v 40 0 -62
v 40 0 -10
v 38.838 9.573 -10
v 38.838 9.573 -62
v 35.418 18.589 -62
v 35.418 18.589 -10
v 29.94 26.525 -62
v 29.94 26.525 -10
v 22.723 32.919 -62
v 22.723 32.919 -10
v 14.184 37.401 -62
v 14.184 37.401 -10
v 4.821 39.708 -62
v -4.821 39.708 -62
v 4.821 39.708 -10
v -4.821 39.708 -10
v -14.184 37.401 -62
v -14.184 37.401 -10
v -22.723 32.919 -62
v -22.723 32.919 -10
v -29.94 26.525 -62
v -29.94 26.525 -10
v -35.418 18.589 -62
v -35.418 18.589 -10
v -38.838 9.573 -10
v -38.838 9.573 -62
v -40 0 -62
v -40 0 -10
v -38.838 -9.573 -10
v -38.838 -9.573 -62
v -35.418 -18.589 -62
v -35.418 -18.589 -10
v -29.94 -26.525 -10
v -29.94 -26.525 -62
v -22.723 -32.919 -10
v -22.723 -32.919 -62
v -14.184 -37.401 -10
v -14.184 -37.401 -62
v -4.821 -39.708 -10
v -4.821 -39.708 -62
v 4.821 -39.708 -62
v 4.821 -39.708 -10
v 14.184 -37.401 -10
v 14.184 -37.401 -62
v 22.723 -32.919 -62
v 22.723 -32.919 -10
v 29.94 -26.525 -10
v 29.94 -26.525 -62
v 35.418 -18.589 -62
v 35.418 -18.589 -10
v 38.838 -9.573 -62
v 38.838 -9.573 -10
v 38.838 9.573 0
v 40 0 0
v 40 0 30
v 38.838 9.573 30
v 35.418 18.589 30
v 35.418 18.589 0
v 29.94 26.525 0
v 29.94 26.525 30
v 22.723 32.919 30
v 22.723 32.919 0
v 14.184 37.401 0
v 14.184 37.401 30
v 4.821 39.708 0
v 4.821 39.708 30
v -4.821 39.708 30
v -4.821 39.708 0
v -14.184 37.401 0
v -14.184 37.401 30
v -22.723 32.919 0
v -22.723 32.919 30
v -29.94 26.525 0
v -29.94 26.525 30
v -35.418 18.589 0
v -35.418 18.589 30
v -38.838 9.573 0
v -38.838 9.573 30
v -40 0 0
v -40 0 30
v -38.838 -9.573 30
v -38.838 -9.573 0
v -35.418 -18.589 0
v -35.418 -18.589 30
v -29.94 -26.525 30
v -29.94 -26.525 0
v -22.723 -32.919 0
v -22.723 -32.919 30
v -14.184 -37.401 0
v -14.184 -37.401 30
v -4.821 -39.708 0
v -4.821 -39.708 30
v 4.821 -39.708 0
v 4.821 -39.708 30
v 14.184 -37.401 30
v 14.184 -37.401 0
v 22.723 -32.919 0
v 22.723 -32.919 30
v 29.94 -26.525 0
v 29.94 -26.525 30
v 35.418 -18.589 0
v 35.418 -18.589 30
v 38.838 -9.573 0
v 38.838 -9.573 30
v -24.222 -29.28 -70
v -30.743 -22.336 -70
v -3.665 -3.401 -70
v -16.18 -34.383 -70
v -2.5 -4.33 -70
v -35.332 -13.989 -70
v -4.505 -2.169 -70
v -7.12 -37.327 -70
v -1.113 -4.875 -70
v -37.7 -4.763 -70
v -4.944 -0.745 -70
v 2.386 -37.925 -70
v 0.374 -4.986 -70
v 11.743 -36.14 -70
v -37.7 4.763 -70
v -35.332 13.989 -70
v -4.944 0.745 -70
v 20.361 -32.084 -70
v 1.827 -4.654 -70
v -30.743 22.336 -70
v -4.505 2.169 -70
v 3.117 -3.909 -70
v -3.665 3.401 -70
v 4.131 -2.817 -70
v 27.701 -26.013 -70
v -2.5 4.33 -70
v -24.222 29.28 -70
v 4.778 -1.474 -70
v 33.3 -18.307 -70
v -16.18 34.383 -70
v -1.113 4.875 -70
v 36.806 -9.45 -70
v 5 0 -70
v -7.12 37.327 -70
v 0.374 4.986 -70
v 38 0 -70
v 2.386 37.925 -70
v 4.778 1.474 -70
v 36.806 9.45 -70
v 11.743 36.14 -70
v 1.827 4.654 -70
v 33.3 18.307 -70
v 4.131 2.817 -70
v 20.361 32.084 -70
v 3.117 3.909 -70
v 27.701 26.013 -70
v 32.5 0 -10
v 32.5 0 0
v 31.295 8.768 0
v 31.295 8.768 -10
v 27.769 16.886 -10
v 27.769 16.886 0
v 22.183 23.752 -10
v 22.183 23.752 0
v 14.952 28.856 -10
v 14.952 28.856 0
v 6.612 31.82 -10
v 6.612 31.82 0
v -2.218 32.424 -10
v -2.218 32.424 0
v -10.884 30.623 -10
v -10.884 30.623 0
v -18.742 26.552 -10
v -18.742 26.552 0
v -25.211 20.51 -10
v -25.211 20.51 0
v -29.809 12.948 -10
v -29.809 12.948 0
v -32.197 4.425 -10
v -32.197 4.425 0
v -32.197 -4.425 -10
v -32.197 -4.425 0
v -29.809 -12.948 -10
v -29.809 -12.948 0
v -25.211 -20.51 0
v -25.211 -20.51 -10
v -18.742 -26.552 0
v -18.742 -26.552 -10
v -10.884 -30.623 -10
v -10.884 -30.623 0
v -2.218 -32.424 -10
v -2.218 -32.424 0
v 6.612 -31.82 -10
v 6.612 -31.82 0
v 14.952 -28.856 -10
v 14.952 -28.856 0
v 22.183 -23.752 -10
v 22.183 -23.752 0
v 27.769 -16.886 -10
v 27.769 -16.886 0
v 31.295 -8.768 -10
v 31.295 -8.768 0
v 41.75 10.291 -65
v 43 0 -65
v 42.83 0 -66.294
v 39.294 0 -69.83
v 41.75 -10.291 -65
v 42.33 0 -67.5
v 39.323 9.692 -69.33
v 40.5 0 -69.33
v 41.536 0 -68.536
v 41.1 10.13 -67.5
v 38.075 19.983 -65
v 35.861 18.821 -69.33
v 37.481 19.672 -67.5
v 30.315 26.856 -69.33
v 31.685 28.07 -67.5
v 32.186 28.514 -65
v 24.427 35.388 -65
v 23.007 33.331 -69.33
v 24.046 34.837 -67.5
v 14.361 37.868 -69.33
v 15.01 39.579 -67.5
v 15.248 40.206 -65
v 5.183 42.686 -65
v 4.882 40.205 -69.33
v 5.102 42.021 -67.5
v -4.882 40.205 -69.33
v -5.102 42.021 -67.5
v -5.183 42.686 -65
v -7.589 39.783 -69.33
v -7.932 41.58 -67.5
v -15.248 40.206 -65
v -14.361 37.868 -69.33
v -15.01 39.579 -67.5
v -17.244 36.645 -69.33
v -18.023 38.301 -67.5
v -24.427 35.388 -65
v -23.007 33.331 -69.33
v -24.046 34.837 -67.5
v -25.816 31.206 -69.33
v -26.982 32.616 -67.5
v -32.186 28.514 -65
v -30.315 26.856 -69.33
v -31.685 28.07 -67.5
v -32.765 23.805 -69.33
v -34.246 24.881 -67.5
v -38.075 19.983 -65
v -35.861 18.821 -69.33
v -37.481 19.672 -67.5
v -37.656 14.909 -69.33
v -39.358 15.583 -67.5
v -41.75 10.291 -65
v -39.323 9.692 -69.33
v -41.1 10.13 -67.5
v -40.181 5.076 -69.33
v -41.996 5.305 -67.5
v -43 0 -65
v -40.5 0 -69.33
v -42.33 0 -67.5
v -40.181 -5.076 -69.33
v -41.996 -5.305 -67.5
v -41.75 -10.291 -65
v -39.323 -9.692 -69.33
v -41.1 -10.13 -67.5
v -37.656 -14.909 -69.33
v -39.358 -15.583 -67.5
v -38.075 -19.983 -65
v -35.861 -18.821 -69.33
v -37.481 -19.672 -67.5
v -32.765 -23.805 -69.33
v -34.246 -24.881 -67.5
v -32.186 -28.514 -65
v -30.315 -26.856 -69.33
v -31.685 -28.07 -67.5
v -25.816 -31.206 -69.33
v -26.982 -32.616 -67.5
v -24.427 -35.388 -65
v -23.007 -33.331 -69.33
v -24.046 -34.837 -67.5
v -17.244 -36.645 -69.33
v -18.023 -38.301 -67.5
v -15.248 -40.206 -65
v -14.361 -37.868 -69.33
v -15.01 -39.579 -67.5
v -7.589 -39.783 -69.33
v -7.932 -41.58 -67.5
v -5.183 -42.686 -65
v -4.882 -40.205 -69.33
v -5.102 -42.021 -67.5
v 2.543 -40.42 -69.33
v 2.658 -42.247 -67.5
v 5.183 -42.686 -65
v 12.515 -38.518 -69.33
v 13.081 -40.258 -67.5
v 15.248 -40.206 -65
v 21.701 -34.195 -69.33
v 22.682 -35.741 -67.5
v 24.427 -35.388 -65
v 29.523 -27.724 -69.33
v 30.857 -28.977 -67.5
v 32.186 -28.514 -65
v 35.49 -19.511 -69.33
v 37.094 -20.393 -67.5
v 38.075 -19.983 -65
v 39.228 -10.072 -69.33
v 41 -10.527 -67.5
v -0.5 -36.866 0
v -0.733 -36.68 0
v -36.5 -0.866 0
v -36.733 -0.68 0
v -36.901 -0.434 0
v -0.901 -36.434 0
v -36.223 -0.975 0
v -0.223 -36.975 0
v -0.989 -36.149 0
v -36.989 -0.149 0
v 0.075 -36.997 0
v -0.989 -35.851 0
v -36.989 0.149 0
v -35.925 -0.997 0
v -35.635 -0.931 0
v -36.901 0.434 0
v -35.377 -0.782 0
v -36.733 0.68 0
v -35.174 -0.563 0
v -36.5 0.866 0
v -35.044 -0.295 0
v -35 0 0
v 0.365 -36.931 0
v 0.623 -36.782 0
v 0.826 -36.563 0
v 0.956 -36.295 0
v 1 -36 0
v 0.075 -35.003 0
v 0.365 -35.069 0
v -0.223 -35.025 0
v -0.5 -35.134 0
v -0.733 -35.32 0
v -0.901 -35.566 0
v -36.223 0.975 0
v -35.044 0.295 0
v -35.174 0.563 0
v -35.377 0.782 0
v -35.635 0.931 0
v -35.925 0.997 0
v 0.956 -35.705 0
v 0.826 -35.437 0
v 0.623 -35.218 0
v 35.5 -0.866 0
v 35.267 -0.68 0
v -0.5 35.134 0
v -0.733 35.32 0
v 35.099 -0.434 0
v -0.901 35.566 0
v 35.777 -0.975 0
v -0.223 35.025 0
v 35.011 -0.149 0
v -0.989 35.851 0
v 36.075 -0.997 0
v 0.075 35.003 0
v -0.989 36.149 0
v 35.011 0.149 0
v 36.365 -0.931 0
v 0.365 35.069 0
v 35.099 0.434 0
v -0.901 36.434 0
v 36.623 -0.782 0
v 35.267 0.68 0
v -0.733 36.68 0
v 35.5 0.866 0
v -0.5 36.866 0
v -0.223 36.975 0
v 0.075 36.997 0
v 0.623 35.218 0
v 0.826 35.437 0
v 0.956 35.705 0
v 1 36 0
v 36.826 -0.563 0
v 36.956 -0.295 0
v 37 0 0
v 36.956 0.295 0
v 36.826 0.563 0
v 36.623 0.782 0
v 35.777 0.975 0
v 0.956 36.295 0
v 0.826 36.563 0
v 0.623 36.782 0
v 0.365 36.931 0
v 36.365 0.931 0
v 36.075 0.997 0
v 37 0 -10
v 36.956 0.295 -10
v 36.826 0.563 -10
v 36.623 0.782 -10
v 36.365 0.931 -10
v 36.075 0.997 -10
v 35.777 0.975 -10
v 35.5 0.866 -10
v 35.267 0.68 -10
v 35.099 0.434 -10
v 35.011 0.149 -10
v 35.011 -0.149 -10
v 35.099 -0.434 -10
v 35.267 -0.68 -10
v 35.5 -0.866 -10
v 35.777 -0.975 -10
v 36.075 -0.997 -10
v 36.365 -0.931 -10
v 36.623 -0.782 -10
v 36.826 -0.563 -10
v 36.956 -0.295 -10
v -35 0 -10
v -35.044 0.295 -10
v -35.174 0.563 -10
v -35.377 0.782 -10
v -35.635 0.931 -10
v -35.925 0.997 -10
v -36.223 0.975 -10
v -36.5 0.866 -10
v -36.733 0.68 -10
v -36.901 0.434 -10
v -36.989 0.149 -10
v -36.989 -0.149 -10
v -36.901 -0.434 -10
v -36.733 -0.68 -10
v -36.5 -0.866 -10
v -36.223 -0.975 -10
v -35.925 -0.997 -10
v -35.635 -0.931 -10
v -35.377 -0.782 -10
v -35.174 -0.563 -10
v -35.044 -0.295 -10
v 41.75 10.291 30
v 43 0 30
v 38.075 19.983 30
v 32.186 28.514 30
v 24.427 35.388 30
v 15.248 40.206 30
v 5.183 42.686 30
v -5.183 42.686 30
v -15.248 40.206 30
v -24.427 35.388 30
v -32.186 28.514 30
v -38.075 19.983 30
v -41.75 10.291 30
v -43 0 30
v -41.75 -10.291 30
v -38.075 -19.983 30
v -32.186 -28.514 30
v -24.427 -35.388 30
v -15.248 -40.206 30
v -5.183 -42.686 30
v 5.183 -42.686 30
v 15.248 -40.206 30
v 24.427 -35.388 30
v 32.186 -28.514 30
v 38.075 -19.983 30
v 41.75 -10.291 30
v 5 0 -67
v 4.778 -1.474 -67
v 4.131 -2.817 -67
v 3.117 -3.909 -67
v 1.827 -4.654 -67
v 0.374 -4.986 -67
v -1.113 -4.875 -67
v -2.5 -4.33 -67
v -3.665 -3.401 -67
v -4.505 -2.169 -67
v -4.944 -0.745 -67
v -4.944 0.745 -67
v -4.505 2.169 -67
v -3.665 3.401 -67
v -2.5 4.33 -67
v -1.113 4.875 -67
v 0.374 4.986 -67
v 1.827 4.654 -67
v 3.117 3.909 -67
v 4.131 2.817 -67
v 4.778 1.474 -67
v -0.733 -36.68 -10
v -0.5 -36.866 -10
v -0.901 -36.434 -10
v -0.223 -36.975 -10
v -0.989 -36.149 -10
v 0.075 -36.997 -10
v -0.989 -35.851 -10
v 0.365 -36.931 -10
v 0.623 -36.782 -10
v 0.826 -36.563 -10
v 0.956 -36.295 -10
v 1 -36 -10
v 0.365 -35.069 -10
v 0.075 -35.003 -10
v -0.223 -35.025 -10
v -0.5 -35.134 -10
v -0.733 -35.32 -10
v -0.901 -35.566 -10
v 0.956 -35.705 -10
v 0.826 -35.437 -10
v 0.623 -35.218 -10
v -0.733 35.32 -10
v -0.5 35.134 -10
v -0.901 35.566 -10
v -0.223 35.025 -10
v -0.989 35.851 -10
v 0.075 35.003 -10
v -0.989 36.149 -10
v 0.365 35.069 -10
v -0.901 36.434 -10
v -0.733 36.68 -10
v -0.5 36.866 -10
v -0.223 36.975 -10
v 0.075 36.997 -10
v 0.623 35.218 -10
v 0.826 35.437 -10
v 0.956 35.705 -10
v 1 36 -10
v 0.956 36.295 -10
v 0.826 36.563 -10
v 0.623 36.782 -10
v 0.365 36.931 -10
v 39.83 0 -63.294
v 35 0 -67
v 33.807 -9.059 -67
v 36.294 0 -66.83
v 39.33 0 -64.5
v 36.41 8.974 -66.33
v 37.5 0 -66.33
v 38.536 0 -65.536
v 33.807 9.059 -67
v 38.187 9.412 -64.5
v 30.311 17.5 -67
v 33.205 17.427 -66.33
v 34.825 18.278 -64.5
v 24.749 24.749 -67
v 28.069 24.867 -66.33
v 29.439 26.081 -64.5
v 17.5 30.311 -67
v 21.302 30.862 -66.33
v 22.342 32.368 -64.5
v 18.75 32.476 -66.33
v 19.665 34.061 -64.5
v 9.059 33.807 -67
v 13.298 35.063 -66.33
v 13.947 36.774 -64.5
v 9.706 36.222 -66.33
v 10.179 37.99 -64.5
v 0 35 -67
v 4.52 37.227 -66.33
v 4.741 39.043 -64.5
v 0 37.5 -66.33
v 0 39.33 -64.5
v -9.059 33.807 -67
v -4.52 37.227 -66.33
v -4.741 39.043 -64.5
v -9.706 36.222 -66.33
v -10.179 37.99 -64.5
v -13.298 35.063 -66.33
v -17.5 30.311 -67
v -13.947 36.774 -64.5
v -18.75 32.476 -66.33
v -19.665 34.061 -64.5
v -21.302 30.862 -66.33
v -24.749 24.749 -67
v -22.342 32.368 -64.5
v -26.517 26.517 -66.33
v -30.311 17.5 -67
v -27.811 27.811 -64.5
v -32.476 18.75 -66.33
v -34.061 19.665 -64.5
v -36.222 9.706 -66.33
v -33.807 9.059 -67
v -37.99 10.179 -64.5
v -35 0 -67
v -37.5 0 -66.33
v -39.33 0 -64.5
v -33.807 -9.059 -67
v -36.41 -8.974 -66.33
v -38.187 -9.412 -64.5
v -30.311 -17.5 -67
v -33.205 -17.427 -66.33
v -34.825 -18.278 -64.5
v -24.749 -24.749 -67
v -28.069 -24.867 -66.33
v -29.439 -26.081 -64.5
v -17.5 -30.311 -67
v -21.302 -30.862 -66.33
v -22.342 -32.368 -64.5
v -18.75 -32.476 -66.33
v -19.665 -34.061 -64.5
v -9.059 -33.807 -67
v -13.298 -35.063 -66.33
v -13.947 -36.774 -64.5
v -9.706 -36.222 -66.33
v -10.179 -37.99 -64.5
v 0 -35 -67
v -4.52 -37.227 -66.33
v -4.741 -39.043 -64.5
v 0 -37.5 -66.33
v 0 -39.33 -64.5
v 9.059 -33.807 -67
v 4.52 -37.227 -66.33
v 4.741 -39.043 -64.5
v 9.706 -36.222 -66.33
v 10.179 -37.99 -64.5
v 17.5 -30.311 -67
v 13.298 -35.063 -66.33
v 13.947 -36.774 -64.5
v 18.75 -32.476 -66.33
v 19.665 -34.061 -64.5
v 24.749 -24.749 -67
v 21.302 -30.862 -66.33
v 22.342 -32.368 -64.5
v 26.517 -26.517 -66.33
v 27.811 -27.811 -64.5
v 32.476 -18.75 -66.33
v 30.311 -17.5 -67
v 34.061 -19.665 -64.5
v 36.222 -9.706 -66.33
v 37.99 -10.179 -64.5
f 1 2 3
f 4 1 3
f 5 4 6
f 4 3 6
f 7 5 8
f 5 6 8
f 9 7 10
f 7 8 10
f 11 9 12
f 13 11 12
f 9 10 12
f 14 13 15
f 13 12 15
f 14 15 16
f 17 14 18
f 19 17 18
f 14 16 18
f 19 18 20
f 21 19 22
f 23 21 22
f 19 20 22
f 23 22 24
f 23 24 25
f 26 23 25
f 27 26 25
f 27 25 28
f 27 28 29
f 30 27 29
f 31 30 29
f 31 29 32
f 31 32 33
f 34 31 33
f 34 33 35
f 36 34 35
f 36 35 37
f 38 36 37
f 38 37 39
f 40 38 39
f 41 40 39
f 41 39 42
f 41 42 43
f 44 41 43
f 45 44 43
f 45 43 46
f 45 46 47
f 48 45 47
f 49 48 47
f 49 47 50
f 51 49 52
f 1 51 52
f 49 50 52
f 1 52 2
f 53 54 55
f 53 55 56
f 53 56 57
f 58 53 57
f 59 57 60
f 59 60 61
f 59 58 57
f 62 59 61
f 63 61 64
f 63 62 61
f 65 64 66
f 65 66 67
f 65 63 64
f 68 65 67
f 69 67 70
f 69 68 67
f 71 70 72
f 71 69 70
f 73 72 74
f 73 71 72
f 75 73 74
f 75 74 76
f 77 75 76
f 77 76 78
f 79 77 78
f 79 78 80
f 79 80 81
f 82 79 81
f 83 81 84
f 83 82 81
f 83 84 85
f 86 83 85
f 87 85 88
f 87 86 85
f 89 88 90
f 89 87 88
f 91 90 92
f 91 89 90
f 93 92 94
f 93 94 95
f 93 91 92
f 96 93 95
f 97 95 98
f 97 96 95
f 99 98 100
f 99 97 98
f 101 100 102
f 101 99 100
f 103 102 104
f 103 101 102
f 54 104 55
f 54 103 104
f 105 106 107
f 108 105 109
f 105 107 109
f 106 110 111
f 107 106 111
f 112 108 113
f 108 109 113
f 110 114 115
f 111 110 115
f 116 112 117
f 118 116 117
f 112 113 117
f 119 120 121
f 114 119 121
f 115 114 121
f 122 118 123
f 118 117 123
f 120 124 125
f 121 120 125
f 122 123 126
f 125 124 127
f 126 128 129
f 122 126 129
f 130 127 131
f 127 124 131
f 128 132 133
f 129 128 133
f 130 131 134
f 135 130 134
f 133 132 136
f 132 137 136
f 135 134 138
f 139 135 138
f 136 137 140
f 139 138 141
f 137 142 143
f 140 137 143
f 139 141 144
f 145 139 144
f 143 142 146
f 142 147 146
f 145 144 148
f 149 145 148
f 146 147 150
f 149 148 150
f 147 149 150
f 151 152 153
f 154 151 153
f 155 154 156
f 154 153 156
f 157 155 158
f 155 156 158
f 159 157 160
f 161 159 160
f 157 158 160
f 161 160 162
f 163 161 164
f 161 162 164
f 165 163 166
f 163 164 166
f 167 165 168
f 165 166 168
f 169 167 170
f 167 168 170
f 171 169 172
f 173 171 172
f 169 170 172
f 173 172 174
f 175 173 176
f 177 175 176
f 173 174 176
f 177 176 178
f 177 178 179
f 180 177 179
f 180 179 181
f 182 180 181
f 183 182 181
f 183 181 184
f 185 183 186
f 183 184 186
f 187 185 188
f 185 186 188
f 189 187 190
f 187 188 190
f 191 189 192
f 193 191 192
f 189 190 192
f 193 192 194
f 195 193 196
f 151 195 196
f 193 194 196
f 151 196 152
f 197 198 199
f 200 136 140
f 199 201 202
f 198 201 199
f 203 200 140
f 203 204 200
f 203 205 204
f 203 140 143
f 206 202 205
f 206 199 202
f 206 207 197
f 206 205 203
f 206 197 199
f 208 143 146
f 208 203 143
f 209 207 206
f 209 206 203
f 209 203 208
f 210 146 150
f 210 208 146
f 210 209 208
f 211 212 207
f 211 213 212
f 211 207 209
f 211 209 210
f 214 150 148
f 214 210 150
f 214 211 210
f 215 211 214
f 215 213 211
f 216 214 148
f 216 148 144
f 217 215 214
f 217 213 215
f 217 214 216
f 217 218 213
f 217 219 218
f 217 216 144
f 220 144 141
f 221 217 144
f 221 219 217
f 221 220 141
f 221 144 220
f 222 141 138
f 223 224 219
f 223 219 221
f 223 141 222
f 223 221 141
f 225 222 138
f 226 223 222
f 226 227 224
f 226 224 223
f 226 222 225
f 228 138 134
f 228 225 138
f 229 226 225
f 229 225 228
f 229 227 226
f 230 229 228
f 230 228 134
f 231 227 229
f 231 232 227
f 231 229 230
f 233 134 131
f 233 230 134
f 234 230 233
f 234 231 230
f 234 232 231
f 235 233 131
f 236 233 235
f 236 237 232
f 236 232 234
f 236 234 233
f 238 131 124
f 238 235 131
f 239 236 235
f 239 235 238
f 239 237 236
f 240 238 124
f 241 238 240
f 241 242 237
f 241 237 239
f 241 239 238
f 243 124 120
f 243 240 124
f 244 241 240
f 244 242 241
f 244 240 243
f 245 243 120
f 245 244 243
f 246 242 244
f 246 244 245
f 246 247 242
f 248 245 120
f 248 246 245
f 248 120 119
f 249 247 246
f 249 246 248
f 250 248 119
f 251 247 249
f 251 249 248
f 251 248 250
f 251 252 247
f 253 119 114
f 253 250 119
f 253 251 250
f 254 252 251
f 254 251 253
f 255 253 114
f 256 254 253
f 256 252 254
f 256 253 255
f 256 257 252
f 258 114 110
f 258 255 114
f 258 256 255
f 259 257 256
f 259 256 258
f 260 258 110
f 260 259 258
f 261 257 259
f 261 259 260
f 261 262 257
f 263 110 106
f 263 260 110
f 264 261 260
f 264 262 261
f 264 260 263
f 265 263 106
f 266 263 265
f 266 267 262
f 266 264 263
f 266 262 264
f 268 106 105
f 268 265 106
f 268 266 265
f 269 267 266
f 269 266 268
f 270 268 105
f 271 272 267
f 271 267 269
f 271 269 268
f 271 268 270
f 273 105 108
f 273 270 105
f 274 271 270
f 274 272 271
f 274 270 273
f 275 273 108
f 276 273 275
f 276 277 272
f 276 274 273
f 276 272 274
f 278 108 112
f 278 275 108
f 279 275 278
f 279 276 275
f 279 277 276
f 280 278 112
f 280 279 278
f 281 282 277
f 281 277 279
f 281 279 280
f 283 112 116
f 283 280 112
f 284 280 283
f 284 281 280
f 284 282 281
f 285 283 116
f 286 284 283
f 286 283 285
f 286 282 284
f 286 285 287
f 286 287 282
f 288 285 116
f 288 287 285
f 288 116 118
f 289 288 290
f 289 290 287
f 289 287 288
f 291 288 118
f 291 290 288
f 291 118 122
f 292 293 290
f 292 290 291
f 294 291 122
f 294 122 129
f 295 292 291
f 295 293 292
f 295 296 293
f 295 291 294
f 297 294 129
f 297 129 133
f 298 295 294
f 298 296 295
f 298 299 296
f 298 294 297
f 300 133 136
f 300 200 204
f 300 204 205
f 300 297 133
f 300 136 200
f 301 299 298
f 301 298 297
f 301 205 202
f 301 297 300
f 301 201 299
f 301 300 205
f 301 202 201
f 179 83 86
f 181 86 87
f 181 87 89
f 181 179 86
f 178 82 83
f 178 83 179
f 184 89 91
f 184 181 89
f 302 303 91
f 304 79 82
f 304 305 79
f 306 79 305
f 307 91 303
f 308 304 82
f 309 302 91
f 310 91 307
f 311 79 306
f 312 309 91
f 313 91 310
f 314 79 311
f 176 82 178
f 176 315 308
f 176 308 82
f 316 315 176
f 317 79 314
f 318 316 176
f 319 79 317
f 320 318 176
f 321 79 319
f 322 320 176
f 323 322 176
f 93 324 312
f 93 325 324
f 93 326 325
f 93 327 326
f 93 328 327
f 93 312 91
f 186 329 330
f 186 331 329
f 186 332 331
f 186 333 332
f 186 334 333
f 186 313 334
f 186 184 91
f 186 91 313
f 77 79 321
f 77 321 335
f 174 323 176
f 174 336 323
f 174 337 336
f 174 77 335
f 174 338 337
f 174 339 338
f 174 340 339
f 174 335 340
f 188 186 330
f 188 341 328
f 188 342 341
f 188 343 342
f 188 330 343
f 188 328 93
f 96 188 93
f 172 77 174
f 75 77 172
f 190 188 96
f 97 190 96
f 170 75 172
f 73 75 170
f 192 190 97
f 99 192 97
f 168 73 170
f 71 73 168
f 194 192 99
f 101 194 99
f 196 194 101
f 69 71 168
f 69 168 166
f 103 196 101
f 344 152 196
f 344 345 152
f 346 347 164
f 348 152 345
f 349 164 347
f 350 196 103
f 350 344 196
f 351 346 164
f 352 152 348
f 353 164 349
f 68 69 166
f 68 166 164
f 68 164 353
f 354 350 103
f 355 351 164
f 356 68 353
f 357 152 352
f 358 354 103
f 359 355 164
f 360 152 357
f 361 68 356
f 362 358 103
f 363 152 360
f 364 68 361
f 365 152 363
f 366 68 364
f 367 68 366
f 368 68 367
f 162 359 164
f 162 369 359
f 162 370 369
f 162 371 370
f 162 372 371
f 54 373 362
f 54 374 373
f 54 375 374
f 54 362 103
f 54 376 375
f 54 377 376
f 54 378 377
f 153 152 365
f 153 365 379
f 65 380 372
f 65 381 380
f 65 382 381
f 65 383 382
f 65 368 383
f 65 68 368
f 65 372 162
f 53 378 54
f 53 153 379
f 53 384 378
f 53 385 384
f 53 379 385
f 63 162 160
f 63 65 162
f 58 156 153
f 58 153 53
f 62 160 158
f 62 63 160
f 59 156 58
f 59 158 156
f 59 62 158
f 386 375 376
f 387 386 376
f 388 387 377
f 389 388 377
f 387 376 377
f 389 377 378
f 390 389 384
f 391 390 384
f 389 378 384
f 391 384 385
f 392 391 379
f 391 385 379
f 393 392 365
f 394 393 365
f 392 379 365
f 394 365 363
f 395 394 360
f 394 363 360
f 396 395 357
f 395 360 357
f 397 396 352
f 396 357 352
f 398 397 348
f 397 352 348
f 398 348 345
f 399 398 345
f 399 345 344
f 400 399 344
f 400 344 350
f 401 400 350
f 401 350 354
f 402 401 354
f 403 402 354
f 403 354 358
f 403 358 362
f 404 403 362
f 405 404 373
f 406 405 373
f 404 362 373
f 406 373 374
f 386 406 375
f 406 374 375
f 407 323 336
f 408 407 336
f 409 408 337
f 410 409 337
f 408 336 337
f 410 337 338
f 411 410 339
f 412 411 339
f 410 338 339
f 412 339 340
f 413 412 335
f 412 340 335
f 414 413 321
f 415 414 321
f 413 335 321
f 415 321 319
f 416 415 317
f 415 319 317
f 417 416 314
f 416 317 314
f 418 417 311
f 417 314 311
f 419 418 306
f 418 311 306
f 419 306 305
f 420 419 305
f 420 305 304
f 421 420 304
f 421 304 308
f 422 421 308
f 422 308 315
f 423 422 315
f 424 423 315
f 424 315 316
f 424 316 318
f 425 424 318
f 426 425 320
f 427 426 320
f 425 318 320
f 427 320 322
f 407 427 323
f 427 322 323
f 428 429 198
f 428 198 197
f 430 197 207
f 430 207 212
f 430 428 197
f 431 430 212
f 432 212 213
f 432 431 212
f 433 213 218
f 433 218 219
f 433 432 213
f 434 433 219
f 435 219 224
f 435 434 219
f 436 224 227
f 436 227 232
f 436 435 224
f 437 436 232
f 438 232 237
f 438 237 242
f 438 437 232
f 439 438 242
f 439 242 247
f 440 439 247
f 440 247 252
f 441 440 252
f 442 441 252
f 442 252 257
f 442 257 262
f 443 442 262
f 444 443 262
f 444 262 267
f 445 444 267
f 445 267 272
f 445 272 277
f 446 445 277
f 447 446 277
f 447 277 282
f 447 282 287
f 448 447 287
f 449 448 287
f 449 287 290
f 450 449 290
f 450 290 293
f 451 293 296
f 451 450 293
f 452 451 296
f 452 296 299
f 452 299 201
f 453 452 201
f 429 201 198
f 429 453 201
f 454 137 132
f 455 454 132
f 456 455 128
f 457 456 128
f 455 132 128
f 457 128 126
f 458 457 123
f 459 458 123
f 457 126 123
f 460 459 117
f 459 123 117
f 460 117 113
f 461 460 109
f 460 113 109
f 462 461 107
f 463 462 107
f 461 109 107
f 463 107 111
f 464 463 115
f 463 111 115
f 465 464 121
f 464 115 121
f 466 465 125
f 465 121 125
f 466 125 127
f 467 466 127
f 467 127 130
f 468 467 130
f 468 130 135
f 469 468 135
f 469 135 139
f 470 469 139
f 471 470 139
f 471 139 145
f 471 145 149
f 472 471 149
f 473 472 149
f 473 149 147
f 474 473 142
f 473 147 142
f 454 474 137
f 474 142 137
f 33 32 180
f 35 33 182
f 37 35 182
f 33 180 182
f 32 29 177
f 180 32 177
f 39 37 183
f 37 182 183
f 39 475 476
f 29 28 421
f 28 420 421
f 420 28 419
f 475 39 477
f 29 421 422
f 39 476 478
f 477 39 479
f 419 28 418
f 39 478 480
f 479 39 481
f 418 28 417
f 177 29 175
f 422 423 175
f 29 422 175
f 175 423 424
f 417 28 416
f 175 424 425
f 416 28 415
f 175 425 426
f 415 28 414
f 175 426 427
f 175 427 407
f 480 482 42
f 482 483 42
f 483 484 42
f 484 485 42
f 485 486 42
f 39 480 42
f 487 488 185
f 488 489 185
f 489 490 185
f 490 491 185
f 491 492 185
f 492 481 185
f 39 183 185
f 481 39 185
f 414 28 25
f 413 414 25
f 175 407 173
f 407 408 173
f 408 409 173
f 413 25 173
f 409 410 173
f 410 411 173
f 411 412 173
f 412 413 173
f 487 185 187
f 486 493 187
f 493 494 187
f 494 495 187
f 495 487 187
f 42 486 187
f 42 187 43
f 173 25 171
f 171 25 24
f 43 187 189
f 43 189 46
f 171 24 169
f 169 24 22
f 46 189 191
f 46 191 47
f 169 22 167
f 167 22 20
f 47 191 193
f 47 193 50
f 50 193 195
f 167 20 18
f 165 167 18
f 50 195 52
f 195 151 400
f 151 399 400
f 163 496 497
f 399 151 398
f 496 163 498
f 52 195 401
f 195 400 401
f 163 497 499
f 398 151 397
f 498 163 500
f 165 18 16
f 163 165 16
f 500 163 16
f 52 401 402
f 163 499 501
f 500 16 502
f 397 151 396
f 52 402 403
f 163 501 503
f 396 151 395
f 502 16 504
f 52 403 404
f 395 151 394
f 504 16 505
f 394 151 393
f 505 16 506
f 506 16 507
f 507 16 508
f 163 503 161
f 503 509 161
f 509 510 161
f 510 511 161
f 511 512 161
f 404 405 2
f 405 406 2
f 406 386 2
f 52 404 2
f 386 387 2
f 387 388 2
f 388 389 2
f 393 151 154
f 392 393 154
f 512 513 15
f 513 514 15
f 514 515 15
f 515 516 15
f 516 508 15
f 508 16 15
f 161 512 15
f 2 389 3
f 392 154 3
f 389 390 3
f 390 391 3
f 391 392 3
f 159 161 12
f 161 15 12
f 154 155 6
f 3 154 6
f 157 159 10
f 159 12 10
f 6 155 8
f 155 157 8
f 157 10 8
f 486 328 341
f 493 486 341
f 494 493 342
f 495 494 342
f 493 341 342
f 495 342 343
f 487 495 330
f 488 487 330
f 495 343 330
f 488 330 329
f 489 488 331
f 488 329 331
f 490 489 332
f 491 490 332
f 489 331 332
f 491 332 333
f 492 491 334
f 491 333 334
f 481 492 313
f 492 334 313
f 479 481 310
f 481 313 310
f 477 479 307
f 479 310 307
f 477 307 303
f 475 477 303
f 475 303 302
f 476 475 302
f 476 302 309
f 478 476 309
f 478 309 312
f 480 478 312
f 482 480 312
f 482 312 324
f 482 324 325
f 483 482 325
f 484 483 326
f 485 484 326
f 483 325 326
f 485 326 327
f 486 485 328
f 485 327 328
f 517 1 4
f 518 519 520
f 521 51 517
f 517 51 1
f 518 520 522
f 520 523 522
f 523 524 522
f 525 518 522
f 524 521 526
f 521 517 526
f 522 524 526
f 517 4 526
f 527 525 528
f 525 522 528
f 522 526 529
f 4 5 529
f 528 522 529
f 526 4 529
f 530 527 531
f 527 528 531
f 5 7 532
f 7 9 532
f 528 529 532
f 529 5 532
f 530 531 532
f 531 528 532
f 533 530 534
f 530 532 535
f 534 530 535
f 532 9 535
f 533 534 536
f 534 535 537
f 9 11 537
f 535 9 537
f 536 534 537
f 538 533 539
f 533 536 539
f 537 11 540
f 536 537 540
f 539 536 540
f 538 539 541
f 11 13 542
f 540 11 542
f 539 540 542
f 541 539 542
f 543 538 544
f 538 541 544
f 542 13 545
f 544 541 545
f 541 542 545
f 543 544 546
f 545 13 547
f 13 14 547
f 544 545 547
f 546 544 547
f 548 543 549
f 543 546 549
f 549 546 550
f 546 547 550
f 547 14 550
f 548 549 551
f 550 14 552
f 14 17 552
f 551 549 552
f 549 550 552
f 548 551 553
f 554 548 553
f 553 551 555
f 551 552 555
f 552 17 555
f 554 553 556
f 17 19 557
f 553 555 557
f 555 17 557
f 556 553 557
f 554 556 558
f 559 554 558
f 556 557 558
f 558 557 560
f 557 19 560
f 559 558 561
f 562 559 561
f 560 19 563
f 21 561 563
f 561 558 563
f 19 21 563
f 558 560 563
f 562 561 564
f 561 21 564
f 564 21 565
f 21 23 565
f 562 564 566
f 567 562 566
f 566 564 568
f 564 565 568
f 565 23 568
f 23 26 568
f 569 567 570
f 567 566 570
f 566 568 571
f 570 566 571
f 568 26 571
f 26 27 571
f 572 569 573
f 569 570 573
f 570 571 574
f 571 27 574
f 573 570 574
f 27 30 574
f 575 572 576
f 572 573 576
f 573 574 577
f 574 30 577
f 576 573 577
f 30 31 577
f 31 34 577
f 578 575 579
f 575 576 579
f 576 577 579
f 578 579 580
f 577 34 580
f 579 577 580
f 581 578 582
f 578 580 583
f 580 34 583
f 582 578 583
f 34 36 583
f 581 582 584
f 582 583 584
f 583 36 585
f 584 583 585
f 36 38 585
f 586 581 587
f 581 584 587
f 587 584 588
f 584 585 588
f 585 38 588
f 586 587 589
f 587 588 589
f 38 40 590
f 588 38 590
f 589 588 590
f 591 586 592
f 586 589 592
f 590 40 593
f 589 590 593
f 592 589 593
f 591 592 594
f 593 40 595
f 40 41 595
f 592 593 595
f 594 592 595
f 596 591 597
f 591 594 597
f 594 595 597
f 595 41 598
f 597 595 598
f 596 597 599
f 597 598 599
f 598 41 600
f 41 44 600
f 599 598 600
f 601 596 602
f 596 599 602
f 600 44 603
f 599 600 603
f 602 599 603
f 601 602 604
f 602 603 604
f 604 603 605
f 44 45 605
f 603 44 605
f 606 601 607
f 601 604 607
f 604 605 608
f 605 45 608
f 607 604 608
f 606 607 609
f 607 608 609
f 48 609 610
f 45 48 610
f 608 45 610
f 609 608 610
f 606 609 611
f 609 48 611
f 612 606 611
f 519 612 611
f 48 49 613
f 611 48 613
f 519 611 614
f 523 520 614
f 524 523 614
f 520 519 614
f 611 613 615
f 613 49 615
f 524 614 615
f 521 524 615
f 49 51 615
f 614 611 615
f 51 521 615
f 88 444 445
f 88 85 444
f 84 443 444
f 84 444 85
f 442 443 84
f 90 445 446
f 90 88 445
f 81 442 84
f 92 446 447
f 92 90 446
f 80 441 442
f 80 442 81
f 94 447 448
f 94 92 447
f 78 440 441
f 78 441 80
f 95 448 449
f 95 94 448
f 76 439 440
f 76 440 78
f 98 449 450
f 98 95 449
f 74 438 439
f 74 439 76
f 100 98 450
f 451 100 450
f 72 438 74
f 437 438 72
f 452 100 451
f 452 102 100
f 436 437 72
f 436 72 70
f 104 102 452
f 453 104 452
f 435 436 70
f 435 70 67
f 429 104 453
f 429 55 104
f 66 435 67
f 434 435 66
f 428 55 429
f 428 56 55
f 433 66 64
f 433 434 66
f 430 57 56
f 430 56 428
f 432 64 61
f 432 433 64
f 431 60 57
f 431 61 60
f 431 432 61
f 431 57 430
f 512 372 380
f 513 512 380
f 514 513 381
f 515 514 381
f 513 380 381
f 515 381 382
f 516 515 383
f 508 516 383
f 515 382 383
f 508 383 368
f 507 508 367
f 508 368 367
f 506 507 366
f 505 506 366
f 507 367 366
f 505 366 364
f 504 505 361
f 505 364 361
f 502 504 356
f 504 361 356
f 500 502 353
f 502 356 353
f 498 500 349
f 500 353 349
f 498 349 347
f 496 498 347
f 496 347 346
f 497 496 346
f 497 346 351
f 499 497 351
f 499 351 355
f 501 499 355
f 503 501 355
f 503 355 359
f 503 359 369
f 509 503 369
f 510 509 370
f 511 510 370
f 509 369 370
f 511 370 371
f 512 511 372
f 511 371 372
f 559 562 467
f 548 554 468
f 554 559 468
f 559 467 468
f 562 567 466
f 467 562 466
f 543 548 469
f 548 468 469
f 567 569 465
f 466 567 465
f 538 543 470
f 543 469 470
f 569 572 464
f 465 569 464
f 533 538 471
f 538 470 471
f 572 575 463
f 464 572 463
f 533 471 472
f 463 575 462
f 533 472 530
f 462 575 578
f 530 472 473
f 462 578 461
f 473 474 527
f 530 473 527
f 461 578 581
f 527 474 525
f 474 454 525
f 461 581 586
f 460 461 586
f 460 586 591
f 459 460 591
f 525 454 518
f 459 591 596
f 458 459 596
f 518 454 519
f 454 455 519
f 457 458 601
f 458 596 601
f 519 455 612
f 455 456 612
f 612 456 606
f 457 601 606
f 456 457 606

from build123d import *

# Parameters (mm, degrees)
F0_R     = 43
F0_R_2   = 40
F1_DEPTH = 30
F2_DEPTH = 70
F0_R_3   = 1
F0_R_4   = 32.5
F3_DEPTH = 10
F4_R     = 43
F4_R_2   = 40
F4_R_3   = 5
F5_DEPTH = 3
F6_R     = 5


with BuildPart() as f1:
    # F0 (on Top) → F1 (new body)
    with BuildSketch(Plane.XY):
        Circle(F0_R)
        Circle(F0_R_2, mode=Mode.SUBTRACT)
    extrude(amount=F1_DEPTH)

    # F0 (on Top) → F2 (join)
    with BuildSketch(Plane.XY):
        Circle(F0_R)
        Circle(F0_R_2, mode=Mode.SUBTRACT)
    extrude(amount=-F2_DEPTH)

    # F0 (on Top) → F3 (join)
    with BuildSketch(Plane.XY):
        Circle(F0_R_2)
        with Locations((0, -36)):
            Circle(F0_R_3, mode=Mode.SUBTRACT)
        with Locations((-36, 0)):
            Circle(F0_R_3, mode=Mode.SUBTRACT)
        Circle(F0_R_4, mode=Mode.SUBTRACT)
        with Locations((36, 0)):
            Circle(F0_R_3, mode=Mode.SUBTRACT)
        with Locations((0, 36)):
            Circle(F0_R_3, mode=Mode.SUBTRACT)
    extrude(amount=-F3_DEPTH)

    # F4 (on face) → F5 (join)
    with BuildSketch(Plane(origin=(0, 0, -70), x_dir=(1, 0, 0), z_dir=(0, 0, -1))):
        Circle(F4_R)
        Circle(F4_R_2, mode=Mode.SUBTRACT)
        Circle(F4_R_2)
        Circle(F4_R_3, mode=Mode.SUBTRACT)
    extrude(amount=-F5_DEPTH)

    # F6
    f6_edges = [f1.edges().sort_by_distance(p)[0] for p in [
        (-43, 0, -70),
        (-40, 0, -67),
    ]]
    fillet(f6_edges, radius=F6_R)


solid = f1.part
